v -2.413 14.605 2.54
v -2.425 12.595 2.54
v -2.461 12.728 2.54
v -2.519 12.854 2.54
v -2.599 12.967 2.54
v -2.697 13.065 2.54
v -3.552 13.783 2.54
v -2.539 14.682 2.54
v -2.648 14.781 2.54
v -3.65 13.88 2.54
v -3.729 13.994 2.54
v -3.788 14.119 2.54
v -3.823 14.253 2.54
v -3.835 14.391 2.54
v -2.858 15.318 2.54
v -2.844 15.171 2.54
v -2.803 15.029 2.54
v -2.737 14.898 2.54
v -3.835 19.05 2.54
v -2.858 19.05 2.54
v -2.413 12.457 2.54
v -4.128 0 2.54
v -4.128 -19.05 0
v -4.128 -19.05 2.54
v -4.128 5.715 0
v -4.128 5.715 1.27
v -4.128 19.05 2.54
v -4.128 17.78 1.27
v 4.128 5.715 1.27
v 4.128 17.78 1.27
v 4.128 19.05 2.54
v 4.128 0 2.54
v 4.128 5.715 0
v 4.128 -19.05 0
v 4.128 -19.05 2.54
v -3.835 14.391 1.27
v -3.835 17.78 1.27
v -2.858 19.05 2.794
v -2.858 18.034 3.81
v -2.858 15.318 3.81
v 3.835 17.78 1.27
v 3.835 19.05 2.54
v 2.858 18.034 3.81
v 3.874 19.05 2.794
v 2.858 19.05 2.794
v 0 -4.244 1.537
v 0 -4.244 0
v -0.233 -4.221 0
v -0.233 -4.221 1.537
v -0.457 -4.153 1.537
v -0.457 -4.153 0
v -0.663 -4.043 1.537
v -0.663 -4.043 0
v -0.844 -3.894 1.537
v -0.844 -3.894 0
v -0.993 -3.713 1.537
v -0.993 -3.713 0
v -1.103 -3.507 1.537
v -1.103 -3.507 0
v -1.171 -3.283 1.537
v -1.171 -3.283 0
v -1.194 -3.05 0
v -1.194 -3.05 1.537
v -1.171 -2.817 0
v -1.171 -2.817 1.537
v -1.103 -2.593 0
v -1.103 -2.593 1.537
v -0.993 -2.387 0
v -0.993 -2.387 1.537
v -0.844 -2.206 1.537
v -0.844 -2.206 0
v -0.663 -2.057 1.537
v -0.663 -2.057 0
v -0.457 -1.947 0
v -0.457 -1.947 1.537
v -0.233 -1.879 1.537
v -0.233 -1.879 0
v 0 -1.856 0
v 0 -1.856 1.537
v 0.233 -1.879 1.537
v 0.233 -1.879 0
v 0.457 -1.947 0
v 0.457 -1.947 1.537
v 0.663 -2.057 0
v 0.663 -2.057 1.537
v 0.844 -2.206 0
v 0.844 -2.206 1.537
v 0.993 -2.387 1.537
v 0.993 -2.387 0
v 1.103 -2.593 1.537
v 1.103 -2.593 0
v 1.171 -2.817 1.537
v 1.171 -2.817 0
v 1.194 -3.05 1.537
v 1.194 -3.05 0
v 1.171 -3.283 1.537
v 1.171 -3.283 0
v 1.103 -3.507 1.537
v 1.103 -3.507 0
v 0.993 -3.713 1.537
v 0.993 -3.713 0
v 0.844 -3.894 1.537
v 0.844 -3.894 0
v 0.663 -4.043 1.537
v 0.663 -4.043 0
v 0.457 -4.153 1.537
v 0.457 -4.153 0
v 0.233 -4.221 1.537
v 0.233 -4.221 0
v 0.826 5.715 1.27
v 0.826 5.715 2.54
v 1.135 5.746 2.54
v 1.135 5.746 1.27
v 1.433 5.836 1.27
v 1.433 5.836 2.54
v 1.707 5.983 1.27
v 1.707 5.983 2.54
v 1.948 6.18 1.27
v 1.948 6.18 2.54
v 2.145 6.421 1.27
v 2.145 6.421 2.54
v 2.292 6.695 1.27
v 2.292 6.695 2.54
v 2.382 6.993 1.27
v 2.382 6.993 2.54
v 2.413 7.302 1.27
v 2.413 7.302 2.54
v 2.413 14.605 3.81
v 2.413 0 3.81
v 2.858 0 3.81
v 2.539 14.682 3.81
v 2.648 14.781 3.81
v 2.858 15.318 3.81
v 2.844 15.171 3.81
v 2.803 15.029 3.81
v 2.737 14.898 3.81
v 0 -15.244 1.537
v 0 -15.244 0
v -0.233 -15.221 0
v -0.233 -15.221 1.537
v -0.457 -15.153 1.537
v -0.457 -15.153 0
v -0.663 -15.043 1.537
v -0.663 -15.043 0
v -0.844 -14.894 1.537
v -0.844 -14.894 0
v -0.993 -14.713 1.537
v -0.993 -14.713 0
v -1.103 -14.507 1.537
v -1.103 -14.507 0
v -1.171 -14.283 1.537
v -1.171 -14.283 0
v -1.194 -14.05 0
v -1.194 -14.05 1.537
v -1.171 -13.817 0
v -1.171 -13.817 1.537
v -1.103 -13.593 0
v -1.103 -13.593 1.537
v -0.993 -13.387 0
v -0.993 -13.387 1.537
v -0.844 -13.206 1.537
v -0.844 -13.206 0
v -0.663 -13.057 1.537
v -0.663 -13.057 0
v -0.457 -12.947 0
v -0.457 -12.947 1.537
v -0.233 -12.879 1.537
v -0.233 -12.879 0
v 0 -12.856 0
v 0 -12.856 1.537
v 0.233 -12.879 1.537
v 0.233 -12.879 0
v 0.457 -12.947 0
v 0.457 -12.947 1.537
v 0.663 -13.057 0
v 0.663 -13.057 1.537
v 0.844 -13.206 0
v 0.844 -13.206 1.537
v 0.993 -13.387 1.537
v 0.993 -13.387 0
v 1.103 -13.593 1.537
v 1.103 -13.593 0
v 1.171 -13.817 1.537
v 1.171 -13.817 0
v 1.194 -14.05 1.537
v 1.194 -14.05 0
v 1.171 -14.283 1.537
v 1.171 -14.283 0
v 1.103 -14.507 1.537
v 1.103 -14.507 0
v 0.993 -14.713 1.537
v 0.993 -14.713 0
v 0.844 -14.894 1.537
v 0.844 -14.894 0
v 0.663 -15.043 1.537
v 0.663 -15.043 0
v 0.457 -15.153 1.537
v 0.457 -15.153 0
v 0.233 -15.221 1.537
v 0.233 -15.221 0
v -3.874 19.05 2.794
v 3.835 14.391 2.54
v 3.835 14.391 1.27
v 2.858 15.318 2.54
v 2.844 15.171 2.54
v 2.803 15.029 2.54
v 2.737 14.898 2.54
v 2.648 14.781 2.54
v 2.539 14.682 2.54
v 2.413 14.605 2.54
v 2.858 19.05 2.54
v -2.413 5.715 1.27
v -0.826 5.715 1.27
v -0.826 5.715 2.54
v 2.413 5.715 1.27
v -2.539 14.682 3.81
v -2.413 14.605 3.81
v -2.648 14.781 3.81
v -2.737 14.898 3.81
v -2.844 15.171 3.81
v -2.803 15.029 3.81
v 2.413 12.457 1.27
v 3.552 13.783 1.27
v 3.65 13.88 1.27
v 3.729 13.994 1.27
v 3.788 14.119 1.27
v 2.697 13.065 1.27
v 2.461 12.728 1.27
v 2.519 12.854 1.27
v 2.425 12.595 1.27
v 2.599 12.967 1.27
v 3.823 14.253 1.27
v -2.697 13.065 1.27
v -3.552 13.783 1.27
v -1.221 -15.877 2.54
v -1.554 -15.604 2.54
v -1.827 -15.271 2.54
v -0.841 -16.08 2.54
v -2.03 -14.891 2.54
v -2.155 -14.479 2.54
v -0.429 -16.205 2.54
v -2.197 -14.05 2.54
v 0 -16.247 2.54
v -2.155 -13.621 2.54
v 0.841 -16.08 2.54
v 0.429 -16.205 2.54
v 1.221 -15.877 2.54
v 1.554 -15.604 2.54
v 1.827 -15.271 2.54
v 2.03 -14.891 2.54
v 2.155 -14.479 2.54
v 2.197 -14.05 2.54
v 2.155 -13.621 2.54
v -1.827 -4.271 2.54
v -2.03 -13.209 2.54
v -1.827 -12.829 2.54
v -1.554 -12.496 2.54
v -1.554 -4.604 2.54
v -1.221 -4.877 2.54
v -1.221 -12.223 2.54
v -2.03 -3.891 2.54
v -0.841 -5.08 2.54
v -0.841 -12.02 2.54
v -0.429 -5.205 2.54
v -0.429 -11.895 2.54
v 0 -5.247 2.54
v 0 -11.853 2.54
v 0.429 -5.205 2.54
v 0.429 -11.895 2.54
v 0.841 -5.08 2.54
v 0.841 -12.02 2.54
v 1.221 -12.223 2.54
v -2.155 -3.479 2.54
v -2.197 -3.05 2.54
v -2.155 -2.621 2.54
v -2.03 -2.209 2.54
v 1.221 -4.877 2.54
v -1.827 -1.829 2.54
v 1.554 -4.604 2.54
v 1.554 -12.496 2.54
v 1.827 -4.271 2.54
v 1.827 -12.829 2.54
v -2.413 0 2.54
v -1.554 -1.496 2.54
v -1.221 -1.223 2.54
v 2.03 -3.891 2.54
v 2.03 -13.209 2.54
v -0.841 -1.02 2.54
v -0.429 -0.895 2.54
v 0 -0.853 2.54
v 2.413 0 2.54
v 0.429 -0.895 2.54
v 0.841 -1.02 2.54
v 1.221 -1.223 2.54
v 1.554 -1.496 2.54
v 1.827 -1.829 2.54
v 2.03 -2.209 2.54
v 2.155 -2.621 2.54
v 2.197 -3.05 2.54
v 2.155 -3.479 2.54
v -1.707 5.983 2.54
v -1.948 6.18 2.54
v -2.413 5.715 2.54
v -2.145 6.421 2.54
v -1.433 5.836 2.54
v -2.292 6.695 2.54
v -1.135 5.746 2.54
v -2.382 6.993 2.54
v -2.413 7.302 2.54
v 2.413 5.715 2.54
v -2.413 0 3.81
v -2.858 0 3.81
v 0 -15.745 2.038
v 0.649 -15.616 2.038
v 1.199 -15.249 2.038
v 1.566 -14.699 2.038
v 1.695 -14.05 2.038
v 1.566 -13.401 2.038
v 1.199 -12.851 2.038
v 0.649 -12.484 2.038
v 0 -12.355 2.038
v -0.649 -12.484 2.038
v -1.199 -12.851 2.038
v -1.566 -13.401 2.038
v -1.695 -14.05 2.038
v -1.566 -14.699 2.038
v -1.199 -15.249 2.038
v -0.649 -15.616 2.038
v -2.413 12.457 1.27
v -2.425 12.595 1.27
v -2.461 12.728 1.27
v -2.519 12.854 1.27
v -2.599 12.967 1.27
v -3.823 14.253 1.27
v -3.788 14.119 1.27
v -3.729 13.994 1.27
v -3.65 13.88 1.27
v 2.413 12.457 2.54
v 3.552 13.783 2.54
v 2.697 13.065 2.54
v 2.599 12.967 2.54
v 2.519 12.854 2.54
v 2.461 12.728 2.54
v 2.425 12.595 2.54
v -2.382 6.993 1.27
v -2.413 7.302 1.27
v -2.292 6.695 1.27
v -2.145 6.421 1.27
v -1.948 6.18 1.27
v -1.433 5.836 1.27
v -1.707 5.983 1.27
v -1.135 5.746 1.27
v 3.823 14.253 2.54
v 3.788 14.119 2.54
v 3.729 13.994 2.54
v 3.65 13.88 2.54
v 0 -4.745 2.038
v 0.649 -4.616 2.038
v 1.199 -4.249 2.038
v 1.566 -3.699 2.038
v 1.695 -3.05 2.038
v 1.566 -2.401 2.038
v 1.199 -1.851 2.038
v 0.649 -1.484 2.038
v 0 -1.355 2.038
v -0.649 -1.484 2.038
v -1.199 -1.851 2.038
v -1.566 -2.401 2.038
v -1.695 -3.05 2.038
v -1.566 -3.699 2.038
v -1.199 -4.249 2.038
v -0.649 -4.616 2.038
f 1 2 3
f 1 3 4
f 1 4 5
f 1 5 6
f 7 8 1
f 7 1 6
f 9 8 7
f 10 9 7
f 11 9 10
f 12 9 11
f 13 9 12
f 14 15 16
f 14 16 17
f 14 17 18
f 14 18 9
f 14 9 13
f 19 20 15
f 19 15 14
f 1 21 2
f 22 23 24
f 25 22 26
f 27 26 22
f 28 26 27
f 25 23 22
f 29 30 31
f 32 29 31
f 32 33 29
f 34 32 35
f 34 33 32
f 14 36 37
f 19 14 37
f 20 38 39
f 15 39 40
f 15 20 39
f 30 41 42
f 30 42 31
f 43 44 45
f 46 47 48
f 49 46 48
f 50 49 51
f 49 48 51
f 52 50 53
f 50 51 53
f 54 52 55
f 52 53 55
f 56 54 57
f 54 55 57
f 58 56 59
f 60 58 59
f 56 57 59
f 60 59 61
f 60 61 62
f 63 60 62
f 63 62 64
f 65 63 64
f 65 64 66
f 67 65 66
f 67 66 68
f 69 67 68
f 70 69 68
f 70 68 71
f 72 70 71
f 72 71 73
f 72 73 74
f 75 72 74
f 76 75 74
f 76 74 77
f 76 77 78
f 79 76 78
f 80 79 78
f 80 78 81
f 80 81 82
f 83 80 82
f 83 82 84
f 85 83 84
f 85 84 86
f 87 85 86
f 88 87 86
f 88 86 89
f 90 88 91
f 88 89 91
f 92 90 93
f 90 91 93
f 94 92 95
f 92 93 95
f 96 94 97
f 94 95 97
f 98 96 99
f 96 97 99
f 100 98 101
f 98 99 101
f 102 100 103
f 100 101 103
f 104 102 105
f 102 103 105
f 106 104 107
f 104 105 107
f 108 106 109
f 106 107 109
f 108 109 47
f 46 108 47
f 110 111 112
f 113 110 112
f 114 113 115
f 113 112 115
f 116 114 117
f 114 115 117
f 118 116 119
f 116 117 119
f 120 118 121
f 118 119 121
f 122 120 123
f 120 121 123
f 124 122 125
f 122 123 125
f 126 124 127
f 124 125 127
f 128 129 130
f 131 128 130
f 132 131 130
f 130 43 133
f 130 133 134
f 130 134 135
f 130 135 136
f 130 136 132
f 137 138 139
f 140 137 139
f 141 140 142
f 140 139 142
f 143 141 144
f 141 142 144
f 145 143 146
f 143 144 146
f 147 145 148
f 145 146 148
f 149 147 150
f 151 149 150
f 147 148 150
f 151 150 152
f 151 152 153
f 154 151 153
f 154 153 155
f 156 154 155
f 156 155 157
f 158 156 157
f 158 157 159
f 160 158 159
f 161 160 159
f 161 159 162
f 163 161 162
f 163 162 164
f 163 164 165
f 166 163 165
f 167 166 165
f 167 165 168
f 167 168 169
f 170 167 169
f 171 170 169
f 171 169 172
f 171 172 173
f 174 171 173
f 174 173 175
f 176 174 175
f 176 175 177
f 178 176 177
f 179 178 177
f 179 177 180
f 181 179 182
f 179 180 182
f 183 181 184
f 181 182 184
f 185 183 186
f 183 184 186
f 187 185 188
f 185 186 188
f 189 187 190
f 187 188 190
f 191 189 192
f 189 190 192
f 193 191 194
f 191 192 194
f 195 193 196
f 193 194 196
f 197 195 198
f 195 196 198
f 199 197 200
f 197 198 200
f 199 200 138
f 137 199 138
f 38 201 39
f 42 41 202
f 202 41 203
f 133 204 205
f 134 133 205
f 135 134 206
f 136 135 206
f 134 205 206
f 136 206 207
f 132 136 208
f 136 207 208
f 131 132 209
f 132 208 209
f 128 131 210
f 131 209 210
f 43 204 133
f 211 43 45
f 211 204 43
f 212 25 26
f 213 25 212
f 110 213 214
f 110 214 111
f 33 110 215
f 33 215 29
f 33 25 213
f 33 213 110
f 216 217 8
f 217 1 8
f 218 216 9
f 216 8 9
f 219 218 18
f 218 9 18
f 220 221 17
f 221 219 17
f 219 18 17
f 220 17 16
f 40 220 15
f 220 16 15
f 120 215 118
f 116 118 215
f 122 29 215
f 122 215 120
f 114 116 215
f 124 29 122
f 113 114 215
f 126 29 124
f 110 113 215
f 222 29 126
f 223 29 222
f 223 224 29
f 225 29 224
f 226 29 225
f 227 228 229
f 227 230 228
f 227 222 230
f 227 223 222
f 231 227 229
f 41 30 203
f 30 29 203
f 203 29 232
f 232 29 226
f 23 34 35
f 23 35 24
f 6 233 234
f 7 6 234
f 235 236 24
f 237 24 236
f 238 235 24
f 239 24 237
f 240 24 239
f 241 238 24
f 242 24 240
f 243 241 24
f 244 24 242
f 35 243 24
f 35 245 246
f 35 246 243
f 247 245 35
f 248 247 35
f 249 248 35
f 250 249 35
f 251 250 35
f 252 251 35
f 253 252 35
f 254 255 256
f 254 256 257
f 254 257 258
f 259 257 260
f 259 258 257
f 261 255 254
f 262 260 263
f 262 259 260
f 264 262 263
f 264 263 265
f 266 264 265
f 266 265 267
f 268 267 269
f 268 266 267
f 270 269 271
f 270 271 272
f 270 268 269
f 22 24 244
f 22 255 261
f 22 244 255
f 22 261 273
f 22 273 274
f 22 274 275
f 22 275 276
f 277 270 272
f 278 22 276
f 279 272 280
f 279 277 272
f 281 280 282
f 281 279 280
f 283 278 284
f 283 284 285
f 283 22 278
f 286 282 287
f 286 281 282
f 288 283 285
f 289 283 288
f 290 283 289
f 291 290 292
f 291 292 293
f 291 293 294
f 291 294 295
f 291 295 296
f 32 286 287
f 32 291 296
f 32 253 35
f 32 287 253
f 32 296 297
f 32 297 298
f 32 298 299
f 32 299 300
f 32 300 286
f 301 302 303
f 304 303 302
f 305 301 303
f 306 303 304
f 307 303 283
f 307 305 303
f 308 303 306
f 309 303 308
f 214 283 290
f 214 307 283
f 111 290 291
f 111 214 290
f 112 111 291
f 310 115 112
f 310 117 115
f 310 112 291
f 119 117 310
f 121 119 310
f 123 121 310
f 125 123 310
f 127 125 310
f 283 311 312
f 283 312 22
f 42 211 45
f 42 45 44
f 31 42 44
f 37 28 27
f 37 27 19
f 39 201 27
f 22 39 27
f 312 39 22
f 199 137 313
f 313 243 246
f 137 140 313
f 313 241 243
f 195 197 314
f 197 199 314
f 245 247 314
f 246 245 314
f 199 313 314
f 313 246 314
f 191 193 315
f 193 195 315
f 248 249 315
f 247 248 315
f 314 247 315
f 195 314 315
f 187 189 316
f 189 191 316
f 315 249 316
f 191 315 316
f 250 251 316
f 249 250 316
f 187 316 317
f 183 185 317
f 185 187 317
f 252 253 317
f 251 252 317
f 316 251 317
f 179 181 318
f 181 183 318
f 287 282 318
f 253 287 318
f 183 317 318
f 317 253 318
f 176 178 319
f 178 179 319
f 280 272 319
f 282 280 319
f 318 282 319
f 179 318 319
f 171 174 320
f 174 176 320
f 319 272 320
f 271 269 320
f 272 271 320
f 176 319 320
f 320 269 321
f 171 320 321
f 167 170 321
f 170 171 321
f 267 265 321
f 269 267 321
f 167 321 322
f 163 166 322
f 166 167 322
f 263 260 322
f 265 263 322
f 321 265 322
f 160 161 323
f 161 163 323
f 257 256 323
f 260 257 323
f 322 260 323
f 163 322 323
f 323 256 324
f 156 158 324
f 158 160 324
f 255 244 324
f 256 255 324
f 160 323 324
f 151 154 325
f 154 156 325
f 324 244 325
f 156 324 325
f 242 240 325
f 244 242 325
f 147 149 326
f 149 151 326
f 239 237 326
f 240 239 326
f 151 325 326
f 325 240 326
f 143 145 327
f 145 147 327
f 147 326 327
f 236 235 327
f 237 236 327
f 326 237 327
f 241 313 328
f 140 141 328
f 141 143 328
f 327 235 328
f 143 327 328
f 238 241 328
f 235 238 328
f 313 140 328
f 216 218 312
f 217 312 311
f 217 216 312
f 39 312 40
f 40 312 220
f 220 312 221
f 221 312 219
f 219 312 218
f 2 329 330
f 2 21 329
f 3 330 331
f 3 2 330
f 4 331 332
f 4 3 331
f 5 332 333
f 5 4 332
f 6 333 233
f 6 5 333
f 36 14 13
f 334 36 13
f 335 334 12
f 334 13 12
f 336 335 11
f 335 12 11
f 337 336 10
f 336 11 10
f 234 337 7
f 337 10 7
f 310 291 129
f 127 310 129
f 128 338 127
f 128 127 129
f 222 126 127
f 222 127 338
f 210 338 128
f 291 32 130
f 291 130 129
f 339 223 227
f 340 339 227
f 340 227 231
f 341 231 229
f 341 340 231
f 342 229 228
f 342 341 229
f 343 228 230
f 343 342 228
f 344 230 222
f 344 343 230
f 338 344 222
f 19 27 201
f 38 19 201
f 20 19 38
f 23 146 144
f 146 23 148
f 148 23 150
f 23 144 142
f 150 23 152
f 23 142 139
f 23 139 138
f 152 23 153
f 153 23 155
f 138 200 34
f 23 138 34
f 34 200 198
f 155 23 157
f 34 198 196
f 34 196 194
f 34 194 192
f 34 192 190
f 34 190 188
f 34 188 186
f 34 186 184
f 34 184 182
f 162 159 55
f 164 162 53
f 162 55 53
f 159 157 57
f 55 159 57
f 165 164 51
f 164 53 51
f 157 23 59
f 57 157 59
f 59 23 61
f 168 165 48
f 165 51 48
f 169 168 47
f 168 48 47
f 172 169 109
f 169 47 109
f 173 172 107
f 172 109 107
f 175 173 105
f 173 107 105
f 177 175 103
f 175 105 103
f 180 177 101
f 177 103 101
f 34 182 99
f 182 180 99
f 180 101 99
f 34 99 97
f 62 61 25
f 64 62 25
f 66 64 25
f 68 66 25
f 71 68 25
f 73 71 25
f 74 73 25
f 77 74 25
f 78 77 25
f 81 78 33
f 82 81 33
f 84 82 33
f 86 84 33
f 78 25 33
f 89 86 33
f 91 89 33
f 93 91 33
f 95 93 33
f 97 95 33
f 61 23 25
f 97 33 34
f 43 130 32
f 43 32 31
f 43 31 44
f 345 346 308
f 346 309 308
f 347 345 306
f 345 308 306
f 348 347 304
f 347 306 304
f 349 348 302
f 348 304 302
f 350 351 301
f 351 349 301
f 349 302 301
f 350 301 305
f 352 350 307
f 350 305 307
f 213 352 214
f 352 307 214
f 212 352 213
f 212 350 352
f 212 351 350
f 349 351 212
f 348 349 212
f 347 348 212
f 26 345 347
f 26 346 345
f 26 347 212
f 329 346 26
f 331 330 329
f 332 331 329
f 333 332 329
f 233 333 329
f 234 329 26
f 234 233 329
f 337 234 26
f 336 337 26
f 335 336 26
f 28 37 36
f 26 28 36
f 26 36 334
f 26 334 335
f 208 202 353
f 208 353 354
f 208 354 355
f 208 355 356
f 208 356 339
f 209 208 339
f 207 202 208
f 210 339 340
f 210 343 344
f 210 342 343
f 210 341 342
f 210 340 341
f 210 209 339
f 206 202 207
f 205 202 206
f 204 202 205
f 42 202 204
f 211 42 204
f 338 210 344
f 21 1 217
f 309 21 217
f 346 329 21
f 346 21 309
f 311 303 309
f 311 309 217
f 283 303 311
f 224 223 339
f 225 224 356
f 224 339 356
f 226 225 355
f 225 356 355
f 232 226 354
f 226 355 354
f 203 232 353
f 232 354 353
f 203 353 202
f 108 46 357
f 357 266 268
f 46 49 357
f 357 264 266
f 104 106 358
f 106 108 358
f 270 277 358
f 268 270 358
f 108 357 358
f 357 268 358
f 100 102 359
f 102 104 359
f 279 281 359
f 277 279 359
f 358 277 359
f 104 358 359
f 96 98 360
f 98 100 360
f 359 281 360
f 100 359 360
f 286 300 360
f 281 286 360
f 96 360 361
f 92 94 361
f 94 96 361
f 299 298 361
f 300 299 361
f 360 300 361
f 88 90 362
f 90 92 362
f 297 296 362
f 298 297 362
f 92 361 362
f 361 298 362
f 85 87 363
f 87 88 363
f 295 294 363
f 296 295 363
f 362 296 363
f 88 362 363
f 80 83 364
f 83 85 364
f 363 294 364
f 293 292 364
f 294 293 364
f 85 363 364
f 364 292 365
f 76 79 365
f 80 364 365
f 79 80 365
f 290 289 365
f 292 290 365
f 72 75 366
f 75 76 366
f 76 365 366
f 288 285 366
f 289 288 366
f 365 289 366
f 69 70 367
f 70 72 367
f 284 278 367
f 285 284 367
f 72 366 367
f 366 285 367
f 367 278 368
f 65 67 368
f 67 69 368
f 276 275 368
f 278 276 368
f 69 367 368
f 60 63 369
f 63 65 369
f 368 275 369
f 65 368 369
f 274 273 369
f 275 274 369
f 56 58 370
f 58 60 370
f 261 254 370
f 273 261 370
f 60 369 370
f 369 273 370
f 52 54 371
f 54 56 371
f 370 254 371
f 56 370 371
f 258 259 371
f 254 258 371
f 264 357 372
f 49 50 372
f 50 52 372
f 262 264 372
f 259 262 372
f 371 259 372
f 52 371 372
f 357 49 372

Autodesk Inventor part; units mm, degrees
ref_plane "YZ Plane" through (0, 0, 0) normal (1, 0, 0) x (0, 1, 0)
ref_plane "XZ Plane" through (0, 0, 0) normal (0, 1, 0) x (-1, 0, 0)
ref_plane "XY Plane" through (0, 0, 0) normal (0, 0, 1) x (1, 0, 0)
sketch "Sketch1" plane through (0, 0, 0) normal (0, 0, 1) x (1, 0, 0)
  line L0 (0, 26.67) -> (0, -26.67) projected
  line L1 (-5.7785, 0) -> (5.7785, 0) projected
  line L2 (4.1275, -19.05) -> (-4.1275, -19.05)
  line L3 (-4.1275, -19.05) -> (-4.1275, 19.05)
  line L4 (-4.1275, 19.05) -> (4.1275, 19.05)
  line L5 (4.1275, 19.05) -> (4.1275, -19.05)
  line L6 (4.1275, -19.05) -> (-4.1275, 19.05) construction
  line L7 (-4.1275, -19.05) -> (4.1275, 19.05) construction
  point P0 (0, 0)
  point P1 (0, -14.05)
  point P2 (0, -3.05)
  dimension "d0" = 38.1
  dimension "d1" = 8.255
  dimension "d2" = 5
  dimension "d3" = 11
extrude "Extrusion1" add sketch "Sketch1" along normal blind 3.81
sketch "Sketch5" plane through (0, 0, 3.81) normal (0, 0, 1) x (1, 0, 0)
  point P0 (0, 0)
  point P1 (0, -3.05)
  point P2 (0, -14.05)
hole "Hole2" at (0, -3.05, 3.81) at (0, -14.05, 3.81) direction (0, 0, -1) diameter 1.27 end through all
sketch "Sketch2" plane through (0, 0, 0) normal (0, 0, -1) x (-1, 0, 0)
  line L0 (4.1275, 19.05) -> (-4.1275, 19.05) projected
  line L1 (-3.8354, 19.05) -> (-3.8354, 14.0205)
  line L2 (-3.8354, 14.0205) -> (-2.413, 12.827)
  line L3 (-2.413, 12.827) -> (2.413, 12.827)
  line L4 (2.413, 12.827) -> (3.8354, 14.0205)
  line L5 (3.8354, 14.0205) -> (3.8354, 19.05)
  line L6 (0, -26.67) -> (0, 26.67) projected
  line L7 (-6.6675, 0) -> (6.6675, 0) projected
  point P0 (0, 0)
  dimension "d13" = 7.6708
  dimension "d14" = 6.223
  dimension "d15" = 4.826
  dimension "d16" = 3.8354
  dimension "d17" = 2.413
  dimension "d18" = 140
extrude "Extrusion2" cut sketch "Sketch2" against normal blind 2.54
sketch "Sketch3" plane through (0, 0, 0) normal (0, 0, -1) x (-1, 0, 0)
  line L0 (-3.8354, 19.05) -> (3.8354, 19.05) projected
  line L1 (-3.8354, 14.0205) -> (-3.8354, 19.05) projected
  line L2 (-2.413, 12.827) -> (-3.8354, 14.0205) projected
  line L3 (2.413, 12.827) -> (-2.413, 12.827) projected
  line L4 (3.8354, 14.0205) -> (2.413, 12.827) projected
  line L5 (3.8354, 19.05) -> (3.8354, 14.0205) projected
  line L6 (0, -26.67) -> (0, 26.67) projected
  line L7 (2.8575, 14.605) -> (-2.8575, 14.605)
  line L8 (-2.8575, 14.605) -> (-2.8575, 19.05)
  line L9 (-2.8575, 19.05) -> (2.8575, 19.05)
  line L10 (2.8575, 19.05) -> (2.8575, 14.605)
  line L11 (2.8575, 14.605) -> (-2.8575, 19.05) construction
  line L12 (-2.8575, 14.605) -> (2.8575, 19.05) construction
  line L13 (2.413, 5.715) -> (-2.413, 5.715)
  line L14 (-2.413, 5.715) -> (-2.413, 14.605)
  line L15 (-2.413, 14.605) -> (2.413, 14.605)
  line L16 (2.413, 14.605) -> (2.413, 5.715)
  line L17 (2.413, 5.715) -> (-2.413, 14.605) construction
  line L18 (-2.413, 5.715) -> (2.413, 14.605) construction
  point P0 (0, 0)
  point P1 (0, 16.8275)
  point P2 (0, 10.16)
  dimension "d21" = 5.715
  dimension "d22" = 4.826
  dimension "d23" = 8.89
  dimension "d24" = 4.445
extrude "Extrusion3" cut sketch "Sketch3" against normal through all contours L0 L6 L7 L8 | L0 L10 L7 L6 | L14 L7 L6 L3 | L3 L6 L13 L14 | L7 L16 L3 L6 | L3 L16 L13 L6
fillet "Fillet1" radius 0.7937 4 edges at (3.8354, 14.0205, 1.27) (2.413, 12.827, 1.27) (-2.413, 12.827, 1.27) (-3.8354, 14.0205, 1.27)
fillet "Fillet2" radius 0.7937 2 edges at (-2.8575, 14.605, 3.175) (2.8575, 14.605, 3.175)
sketch "Sketch6" plane through (0, 0, 0) normal (0, 0, -1) x (-1, 0, 0)
  line L0 (0, -26.67) -> (0, 26.67) projected
  line L1 (-8.89, 0) -> (8.89, 0) projected
  line L2 (6.35, 5.715) -> (-6.35, 5.715)
  line L3 (-6.35, 5.715) -> (-6.35, 19.05)
  line L4 (-6.35, 19.05) -> (6.35, 19.05)
  line L5 (6.35, 19.05) -> (6.35, 5.715)
  line L6 (6.35, 5.715) -> (-6.35, 19.05) construction
  line L7 (-6.35, 5.715) -> (6.35, 19.05) construction
  line L8 (-3.8354, 19.05) -> (-4.1275, 19.05) projected
  point P0 (0, 0)
  point P1 (0, 12.3825)
  dimension "d50" = 12.7
  dimension "d51" = 5.715
  dimension "d52" = 0
extrude "Extrusion5" cut sketch "Sketch6" against normal blind 1.27
chamfer "Chamfer1" distance 1.27 angle 45 2 edges at (3.9815, 19.05, 1.27) (-3.9814, 19.05, 1.27)
chamfer "Chamfer2" distance 1.016 angle 45 2 edges at (3.4925, 19.05, 3.81) (-3.4925, 19.05, 3.81)
sketch "Sketch7" plane through (0, 0, 3.81) normal (0, 0, 1) x (1, 0, 0)
  line L0 (-4.1275, 18.034) -> (-2.8575, 18.034) projected
  line L1 (-4.1275, 18.034) -> (-4.1275, -19.05) projected
  line L2 (-4.1275, -19.05) -> (4.1275, -19.05) projected
  line L3 (4.1275, -19.05) -> (4.1275, 18.034) projected
  line L4 (2.8575, 18.034) -> (4.1275, 18.034) projected
  line L5 (2.8575, 18.034) -> (2.8575, 15.3178) projected
  arc A0 (2.413, 14.605) -> (2.8575, 15.3178) centre (2.0638, 15.3178) ccw projected
  line L6 (2.413, 14.605) -> (2.413, 5.715) projected
  line L7 (2.413, 5.715) -> (-2.413, 5.715) projected
  line L8 (-2.413, 5.715) -> (-2.413, 14.605) projected
  arc A1 (-2.8575, 15.3178) -> (-2.413, 14.605) centre (-2.0637, 15.3178) ccw projected
  line L9 (-2.8575, 15.3178) -> (-2.8575, 18.034) projected
  circle A2 centre (0, -3.05) radius 0.635 projected
  circle A3 centre (0, -14.05) radius 0.635 projected
  line L10 (-4.1275, -19.05) -> (4.1275, -19.05)
  line L11 (4.1275, -19.05) -> (4.1275, 0)
  line L12 (4.1275, 0) -> (-4.1275, 0)
  line L13 (-4.1275, 0) -> (-4.1275, -19.05)
  line L14 (-6.6675, 0) -> (6.6675, 0) projected
  line L15 (0, 26.67) -> (0, -26.67) projected
  line L16 (2.413, 0) -> (-2.413, 0)
  line L17 (-2.413, 0) -> (-2.413, 5.715)
  line L18 (-2.413, 5.715) -> (2.413, 5.715)
  line L19 (2.413, 5.715) -> (2.413, 0)
  line L20 (2.413, 0) -> (-2.413, 5.715) construction
  line L21 (-2.413, 0) -> (2.413, 5.715) construction
  point P0 (0, 0)
  point P1 (0, 2.8575)
  dimension "d55" = 0
  dimension "d58" = 0
extrude "Extrusion6" cut sketch "Sketch7" against normal blind 1.27 contours L12 L15 A2 A3 L2 L1 | L15 A3 A2 L12 L3 L2
hole "Hole3" at (0, -3.05, 2.54) direction (0, 0, -1) diameter 2.3876 end through all countersink diameter 4.3942 countersink angle 90 clearance for "Flat Head Machine Screw" size "M2" standard "Ansi Metric M Profile"
hole "Hole4" at (0, -14.05, 2.54) direction (0, 0, -1) diameter 2.3876 end through all countersink diameter 4.3942 countersink angle 90 clearance for "Flat Head Machine Screw" size "M2" standard "Ansi Metric M Profile"
extrude "Extrusion7" cut sketch "Sketch7" against normal up to surface (1.27 mm away) contours L17 L7 L15 L12 | L15 L7 L19 L12
fillet "Fillet3" radius 1.5875 2 edges at (2.413, 5.715, 1.905) (-2.413, 5.715, 1.905)
chamfer "Chamfer4" distance 1.27 angle 45 2 edges at (-4.1275, 9.017, 3.81) (4.1275, 9.017, 3.81)
equation "\"d16\" = 0.5 * d13"
equation "\"d17\" = 0.5 * d15"
properties part number "J007803" material "VERO BLACK"
